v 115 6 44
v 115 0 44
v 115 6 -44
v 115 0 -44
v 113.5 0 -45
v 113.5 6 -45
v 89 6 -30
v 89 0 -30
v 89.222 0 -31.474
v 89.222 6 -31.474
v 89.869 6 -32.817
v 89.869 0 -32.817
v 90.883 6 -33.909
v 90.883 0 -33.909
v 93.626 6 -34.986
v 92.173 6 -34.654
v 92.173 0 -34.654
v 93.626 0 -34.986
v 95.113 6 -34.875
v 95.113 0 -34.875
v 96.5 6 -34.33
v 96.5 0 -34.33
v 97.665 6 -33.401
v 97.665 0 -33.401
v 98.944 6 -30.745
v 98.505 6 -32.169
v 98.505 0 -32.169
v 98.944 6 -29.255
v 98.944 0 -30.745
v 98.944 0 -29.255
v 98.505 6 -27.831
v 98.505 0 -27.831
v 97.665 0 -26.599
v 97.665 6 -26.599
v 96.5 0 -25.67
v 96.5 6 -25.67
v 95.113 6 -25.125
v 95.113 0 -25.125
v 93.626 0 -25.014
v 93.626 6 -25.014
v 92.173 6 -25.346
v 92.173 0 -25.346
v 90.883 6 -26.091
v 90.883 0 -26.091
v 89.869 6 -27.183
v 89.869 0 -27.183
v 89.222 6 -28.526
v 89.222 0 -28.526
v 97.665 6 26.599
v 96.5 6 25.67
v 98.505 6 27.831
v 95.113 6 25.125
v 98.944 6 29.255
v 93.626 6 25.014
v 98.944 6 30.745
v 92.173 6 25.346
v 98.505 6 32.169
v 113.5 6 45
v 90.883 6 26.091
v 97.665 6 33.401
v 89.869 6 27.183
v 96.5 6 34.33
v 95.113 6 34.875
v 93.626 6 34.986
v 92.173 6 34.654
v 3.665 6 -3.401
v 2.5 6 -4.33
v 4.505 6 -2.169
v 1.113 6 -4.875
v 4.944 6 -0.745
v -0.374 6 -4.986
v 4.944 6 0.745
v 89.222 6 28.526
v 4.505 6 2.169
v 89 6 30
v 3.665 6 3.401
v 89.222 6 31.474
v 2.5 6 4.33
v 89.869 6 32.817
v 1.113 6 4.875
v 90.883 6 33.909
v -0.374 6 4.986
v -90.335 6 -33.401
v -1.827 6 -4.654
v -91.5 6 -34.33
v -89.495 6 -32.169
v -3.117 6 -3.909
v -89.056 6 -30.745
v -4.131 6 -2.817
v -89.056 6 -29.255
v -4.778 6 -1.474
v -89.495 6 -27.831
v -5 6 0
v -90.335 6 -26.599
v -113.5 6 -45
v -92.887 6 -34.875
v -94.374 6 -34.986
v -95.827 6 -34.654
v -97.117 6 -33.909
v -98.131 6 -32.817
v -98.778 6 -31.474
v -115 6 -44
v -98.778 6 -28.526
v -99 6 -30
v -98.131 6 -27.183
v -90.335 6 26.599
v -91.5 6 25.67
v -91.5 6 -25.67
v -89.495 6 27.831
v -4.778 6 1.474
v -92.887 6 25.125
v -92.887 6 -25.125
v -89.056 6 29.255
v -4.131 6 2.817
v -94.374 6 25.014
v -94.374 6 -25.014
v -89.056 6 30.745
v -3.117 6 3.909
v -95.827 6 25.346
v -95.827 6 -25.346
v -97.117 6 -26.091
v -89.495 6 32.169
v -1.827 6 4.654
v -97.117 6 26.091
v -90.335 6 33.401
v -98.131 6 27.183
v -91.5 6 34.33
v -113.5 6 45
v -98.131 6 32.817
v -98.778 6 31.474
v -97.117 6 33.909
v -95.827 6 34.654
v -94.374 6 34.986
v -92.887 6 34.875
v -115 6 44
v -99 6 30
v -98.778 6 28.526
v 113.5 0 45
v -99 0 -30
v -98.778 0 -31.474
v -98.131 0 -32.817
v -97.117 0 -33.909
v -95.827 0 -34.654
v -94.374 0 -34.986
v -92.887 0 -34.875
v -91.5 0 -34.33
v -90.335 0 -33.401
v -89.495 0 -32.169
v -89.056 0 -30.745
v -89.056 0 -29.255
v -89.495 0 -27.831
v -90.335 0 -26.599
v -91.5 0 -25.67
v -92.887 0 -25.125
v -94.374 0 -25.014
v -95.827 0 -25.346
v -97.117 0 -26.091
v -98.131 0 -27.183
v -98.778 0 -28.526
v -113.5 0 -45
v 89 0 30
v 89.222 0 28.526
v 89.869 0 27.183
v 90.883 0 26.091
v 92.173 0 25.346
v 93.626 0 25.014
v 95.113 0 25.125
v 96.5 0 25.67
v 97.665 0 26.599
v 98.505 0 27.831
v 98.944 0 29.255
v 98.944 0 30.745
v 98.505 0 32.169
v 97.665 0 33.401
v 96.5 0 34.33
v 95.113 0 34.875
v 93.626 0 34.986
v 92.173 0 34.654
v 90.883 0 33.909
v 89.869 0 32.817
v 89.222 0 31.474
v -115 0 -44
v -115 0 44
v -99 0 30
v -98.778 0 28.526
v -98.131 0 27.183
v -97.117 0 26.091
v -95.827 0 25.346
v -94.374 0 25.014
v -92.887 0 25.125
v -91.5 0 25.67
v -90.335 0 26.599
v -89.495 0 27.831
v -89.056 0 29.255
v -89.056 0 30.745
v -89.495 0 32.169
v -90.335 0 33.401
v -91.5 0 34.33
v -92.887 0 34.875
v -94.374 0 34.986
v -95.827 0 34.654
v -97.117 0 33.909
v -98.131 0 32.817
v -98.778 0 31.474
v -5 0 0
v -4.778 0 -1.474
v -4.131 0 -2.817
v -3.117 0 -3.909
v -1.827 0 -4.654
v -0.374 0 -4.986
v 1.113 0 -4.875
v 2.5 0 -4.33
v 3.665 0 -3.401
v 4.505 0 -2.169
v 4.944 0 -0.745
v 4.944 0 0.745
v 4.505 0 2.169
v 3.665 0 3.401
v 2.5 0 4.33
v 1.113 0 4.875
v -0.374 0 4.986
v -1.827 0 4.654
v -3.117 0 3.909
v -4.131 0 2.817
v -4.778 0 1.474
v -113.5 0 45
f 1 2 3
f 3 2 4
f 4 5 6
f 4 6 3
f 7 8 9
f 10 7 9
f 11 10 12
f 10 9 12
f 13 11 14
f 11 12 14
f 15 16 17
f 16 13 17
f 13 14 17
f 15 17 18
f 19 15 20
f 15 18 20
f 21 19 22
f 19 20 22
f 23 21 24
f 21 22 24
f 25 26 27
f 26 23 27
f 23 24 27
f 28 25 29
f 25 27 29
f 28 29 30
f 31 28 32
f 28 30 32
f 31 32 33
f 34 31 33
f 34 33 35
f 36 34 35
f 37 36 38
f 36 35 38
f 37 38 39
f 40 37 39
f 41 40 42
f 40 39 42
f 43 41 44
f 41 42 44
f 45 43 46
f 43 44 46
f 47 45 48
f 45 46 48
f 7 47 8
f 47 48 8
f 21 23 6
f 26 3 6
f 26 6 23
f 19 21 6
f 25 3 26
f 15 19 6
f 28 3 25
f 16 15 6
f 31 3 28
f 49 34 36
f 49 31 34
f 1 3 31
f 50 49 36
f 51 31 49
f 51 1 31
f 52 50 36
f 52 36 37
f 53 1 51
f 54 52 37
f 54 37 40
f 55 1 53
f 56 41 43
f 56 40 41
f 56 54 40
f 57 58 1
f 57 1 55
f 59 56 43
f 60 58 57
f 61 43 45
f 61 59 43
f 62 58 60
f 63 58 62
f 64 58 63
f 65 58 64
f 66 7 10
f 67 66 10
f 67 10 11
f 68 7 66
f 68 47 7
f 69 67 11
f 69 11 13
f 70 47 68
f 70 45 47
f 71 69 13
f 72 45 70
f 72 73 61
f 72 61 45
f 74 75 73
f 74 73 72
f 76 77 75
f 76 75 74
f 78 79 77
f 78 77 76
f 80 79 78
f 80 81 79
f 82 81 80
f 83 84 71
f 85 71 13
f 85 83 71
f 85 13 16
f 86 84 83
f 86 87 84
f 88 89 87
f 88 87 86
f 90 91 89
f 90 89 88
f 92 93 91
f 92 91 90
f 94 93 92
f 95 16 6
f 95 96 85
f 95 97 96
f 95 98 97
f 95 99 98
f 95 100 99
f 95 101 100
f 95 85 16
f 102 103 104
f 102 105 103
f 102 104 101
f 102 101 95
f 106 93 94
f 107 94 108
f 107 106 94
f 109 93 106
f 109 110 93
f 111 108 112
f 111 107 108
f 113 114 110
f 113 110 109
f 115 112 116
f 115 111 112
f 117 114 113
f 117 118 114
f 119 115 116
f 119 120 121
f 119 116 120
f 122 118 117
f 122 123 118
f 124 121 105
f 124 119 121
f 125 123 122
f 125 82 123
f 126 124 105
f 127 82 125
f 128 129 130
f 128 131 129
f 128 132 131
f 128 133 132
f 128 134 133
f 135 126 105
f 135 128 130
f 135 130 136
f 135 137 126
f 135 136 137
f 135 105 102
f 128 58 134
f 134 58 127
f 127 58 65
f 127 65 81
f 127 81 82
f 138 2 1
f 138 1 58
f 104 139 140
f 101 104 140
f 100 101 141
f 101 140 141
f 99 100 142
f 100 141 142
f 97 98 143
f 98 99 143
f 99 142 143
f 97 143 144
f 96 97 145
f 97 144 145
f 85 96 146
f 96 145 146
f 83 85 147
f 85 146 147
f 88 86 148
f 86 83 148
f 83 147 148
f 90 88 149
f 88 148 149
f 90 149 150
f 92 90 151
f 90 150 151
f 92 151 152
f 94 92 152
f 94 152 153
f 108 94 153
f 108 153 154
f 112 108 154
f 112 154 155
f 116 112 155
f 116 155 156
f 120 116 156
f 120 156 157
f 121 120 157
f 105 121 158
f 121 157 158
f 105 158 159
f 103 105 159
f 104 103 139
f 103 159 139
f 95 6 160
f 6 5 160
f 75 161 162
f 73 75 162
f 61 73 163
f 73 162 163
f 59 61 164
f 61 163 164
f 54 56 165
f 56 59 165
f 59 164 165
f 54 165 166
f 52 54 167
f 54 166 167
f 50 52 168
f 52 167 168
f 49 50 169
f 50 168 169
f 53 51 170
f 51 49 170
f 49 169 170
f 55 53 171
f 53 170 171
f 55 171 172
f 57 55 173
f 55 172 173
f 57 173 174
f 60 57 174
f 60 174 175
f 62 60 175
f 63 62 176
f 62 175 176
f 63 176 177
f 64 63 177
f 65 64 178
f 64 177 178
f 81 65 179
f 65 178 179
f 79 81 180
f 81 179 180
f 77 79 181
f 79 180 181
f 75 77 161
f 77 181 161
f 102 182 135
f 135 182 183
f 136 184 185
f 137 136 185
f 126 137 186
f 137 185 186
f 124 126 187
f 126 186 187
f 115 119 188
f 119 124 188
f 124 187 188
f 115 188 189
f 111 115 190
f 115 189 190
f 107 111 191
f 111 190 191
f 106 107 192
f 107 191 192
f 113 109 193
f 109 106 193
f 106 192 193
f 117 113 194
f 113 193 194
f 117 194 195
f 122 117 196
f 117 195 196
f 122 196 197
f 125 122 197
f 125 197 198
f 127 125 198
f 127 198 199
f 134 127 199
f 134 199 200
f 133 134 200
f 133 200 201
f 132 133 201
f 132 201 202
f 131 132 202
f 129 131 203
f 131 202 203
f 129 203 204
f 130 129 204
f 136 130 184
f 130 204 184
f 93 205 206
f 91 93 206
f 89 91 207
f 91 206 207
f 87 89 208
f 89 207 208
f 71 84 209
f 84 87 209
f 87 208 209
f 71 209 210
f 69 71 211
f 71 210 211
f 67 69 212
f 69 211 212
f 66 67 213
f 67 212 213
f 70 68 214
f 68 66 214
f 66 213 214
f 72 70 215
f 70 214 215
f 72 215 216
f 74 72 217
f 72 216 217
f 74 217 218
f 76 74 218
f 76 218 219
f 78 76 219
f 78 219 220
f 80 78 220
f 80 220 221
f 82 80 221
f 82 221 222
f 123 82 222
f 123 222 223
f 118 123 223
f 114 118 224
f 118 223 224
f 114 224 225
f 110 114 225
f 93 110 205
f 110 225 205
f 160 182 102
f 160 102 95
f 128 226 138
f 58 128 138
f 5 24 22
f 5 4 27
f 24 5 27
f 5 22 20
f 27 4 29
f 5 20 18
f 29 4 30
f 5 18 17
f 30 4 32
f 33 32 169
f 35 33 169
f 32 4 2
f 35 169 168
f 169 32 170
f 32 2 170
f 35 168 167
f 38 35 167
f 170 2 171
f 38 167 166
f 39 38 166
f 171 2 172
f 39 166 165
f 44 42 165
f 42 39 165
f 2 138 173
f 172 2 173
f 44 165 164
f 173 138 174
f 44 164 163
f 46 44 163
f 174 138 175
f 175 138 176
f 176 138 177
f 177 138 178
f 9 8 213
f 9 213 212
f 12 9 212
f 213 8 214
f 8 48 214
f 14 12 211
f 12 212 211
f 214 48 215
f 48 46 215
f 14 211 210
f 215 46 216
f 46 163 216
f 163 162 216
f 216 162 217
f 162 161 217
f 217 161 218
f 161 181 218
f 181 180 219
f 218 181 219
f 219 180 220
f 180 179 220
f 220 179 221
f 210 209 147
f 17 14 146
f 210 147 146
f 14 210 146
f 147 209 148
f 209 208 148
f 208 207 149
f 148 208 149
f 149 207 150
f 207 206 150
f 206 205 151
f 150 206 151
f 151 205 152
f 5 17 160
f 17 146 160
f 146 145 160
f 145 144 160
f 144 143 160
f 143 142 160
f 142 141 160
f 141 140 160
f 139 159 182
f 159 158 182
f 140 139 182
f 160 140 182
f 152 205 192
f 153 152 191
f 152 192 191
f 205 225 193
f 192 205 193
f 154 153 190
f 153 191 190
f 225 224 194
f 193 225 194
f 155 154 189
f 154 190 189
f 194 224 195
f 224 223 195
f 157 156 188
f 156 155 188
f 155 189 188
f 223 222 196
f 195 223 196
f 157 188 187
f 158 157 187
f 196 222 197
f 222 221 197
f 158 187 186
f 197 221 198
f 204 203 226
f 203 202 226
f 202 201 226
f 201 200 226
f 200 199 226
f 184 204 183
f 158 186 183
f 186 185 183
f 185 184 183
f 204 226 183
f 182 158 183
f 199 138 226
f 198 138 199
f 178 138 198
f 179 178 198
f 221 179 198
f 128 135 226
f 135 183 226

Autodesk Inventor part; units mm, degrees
ref_plane "YZ Plane" through (0, 0, 0) normal (1, 0, 0) x (0, 1, 0)
ref_plane "XZ Plane" through (0, 0, 0) normal (0, 1, 0) x (-1, 0, 0)
ref_plane "XY Plane" through (0, 0, 0) normal (0, 0, 1) x (1, 0, 0)
sketch "Sketch1" plane through (0, 0, 0) normal (0, 1, 0) x (-1, 0, 0)
  line L0 (-113.5, -45) -> (113.5, -45)
  line L1 (115, -44) -> (115, 44)
  line L2 (113.5, 45) -> (-113.5, 45)
  line L3 (-115, 44) -> (-115, -44)
  circle A0 centre (0, 0) radius 5
  line L4 (-113.5, -45) -> (-115, -44)
  line L5 (-115, 44) -> (-113.5, 45)
  line L6 (115, 44) -> (113.5, 45)
  line L7 (115, -44) -> (113.5, -45)
  circle A1 centre (-94, -30) radius 5
  circle A2 centre (-94, 30) radius 5
  line L8 (0, 45) -> (0, -45) construction
  circle A3 centre (94, -30) radius 5
  circle A4 centre (94, 30) radius 5
  point P0 (-115, -45)
  point P1 (115, 45)
  point P2 (115, -45)
  point P3 (-115, 45)
  point P4 (115, 0)
  dimension "d0" = 230
  dimension "d1" = 90
  dimension "d2" = 115
  dimension "d3" = 45
  dimension "d6" = 10
  dimension "d7" = 1.5
  dimension "d8" = 1
  dimension "d9" = 1
  dimension "d10" = 1.5
  dimension "d11" = 1
  dimension "d12" = 1.5
  dimension "d13" = 1
  dimension "d14" = 1.5
  dimension "d15" = 10
  dimension "d16" = 10
  dimension "d17" = 30
  dimension "d18" = 30
  dimension "d19" = 94
  dimension "d20" = 94
extrude "Extrusion1" add sketch "Sketch1" along normal blind 6
equation "\"d2\" = 0.5 * d0"
equation "\"d3\" = 0.5 * d1"
equation "\"d9\" = d8"
equation "\"d10\" = d7"
equation "\"d11\" = d8"
equation "\"d12\" = d7"
equation "\"d13\" = d8"
equation "\"d14\" = d7"
equation "\"d18\" = d17"
equation "\"d19\" = plate_thick + 0.5 * plates_spacing + brakcet_hole_to_plate"
equation "\"d20\" = d19"
equation "\"plate_thick\" = 6"
equation "\"plates_spacing\" = 116"
equation "\"brakcet_hole_to_plate\" = 30"
properties part number "rig_connector"
